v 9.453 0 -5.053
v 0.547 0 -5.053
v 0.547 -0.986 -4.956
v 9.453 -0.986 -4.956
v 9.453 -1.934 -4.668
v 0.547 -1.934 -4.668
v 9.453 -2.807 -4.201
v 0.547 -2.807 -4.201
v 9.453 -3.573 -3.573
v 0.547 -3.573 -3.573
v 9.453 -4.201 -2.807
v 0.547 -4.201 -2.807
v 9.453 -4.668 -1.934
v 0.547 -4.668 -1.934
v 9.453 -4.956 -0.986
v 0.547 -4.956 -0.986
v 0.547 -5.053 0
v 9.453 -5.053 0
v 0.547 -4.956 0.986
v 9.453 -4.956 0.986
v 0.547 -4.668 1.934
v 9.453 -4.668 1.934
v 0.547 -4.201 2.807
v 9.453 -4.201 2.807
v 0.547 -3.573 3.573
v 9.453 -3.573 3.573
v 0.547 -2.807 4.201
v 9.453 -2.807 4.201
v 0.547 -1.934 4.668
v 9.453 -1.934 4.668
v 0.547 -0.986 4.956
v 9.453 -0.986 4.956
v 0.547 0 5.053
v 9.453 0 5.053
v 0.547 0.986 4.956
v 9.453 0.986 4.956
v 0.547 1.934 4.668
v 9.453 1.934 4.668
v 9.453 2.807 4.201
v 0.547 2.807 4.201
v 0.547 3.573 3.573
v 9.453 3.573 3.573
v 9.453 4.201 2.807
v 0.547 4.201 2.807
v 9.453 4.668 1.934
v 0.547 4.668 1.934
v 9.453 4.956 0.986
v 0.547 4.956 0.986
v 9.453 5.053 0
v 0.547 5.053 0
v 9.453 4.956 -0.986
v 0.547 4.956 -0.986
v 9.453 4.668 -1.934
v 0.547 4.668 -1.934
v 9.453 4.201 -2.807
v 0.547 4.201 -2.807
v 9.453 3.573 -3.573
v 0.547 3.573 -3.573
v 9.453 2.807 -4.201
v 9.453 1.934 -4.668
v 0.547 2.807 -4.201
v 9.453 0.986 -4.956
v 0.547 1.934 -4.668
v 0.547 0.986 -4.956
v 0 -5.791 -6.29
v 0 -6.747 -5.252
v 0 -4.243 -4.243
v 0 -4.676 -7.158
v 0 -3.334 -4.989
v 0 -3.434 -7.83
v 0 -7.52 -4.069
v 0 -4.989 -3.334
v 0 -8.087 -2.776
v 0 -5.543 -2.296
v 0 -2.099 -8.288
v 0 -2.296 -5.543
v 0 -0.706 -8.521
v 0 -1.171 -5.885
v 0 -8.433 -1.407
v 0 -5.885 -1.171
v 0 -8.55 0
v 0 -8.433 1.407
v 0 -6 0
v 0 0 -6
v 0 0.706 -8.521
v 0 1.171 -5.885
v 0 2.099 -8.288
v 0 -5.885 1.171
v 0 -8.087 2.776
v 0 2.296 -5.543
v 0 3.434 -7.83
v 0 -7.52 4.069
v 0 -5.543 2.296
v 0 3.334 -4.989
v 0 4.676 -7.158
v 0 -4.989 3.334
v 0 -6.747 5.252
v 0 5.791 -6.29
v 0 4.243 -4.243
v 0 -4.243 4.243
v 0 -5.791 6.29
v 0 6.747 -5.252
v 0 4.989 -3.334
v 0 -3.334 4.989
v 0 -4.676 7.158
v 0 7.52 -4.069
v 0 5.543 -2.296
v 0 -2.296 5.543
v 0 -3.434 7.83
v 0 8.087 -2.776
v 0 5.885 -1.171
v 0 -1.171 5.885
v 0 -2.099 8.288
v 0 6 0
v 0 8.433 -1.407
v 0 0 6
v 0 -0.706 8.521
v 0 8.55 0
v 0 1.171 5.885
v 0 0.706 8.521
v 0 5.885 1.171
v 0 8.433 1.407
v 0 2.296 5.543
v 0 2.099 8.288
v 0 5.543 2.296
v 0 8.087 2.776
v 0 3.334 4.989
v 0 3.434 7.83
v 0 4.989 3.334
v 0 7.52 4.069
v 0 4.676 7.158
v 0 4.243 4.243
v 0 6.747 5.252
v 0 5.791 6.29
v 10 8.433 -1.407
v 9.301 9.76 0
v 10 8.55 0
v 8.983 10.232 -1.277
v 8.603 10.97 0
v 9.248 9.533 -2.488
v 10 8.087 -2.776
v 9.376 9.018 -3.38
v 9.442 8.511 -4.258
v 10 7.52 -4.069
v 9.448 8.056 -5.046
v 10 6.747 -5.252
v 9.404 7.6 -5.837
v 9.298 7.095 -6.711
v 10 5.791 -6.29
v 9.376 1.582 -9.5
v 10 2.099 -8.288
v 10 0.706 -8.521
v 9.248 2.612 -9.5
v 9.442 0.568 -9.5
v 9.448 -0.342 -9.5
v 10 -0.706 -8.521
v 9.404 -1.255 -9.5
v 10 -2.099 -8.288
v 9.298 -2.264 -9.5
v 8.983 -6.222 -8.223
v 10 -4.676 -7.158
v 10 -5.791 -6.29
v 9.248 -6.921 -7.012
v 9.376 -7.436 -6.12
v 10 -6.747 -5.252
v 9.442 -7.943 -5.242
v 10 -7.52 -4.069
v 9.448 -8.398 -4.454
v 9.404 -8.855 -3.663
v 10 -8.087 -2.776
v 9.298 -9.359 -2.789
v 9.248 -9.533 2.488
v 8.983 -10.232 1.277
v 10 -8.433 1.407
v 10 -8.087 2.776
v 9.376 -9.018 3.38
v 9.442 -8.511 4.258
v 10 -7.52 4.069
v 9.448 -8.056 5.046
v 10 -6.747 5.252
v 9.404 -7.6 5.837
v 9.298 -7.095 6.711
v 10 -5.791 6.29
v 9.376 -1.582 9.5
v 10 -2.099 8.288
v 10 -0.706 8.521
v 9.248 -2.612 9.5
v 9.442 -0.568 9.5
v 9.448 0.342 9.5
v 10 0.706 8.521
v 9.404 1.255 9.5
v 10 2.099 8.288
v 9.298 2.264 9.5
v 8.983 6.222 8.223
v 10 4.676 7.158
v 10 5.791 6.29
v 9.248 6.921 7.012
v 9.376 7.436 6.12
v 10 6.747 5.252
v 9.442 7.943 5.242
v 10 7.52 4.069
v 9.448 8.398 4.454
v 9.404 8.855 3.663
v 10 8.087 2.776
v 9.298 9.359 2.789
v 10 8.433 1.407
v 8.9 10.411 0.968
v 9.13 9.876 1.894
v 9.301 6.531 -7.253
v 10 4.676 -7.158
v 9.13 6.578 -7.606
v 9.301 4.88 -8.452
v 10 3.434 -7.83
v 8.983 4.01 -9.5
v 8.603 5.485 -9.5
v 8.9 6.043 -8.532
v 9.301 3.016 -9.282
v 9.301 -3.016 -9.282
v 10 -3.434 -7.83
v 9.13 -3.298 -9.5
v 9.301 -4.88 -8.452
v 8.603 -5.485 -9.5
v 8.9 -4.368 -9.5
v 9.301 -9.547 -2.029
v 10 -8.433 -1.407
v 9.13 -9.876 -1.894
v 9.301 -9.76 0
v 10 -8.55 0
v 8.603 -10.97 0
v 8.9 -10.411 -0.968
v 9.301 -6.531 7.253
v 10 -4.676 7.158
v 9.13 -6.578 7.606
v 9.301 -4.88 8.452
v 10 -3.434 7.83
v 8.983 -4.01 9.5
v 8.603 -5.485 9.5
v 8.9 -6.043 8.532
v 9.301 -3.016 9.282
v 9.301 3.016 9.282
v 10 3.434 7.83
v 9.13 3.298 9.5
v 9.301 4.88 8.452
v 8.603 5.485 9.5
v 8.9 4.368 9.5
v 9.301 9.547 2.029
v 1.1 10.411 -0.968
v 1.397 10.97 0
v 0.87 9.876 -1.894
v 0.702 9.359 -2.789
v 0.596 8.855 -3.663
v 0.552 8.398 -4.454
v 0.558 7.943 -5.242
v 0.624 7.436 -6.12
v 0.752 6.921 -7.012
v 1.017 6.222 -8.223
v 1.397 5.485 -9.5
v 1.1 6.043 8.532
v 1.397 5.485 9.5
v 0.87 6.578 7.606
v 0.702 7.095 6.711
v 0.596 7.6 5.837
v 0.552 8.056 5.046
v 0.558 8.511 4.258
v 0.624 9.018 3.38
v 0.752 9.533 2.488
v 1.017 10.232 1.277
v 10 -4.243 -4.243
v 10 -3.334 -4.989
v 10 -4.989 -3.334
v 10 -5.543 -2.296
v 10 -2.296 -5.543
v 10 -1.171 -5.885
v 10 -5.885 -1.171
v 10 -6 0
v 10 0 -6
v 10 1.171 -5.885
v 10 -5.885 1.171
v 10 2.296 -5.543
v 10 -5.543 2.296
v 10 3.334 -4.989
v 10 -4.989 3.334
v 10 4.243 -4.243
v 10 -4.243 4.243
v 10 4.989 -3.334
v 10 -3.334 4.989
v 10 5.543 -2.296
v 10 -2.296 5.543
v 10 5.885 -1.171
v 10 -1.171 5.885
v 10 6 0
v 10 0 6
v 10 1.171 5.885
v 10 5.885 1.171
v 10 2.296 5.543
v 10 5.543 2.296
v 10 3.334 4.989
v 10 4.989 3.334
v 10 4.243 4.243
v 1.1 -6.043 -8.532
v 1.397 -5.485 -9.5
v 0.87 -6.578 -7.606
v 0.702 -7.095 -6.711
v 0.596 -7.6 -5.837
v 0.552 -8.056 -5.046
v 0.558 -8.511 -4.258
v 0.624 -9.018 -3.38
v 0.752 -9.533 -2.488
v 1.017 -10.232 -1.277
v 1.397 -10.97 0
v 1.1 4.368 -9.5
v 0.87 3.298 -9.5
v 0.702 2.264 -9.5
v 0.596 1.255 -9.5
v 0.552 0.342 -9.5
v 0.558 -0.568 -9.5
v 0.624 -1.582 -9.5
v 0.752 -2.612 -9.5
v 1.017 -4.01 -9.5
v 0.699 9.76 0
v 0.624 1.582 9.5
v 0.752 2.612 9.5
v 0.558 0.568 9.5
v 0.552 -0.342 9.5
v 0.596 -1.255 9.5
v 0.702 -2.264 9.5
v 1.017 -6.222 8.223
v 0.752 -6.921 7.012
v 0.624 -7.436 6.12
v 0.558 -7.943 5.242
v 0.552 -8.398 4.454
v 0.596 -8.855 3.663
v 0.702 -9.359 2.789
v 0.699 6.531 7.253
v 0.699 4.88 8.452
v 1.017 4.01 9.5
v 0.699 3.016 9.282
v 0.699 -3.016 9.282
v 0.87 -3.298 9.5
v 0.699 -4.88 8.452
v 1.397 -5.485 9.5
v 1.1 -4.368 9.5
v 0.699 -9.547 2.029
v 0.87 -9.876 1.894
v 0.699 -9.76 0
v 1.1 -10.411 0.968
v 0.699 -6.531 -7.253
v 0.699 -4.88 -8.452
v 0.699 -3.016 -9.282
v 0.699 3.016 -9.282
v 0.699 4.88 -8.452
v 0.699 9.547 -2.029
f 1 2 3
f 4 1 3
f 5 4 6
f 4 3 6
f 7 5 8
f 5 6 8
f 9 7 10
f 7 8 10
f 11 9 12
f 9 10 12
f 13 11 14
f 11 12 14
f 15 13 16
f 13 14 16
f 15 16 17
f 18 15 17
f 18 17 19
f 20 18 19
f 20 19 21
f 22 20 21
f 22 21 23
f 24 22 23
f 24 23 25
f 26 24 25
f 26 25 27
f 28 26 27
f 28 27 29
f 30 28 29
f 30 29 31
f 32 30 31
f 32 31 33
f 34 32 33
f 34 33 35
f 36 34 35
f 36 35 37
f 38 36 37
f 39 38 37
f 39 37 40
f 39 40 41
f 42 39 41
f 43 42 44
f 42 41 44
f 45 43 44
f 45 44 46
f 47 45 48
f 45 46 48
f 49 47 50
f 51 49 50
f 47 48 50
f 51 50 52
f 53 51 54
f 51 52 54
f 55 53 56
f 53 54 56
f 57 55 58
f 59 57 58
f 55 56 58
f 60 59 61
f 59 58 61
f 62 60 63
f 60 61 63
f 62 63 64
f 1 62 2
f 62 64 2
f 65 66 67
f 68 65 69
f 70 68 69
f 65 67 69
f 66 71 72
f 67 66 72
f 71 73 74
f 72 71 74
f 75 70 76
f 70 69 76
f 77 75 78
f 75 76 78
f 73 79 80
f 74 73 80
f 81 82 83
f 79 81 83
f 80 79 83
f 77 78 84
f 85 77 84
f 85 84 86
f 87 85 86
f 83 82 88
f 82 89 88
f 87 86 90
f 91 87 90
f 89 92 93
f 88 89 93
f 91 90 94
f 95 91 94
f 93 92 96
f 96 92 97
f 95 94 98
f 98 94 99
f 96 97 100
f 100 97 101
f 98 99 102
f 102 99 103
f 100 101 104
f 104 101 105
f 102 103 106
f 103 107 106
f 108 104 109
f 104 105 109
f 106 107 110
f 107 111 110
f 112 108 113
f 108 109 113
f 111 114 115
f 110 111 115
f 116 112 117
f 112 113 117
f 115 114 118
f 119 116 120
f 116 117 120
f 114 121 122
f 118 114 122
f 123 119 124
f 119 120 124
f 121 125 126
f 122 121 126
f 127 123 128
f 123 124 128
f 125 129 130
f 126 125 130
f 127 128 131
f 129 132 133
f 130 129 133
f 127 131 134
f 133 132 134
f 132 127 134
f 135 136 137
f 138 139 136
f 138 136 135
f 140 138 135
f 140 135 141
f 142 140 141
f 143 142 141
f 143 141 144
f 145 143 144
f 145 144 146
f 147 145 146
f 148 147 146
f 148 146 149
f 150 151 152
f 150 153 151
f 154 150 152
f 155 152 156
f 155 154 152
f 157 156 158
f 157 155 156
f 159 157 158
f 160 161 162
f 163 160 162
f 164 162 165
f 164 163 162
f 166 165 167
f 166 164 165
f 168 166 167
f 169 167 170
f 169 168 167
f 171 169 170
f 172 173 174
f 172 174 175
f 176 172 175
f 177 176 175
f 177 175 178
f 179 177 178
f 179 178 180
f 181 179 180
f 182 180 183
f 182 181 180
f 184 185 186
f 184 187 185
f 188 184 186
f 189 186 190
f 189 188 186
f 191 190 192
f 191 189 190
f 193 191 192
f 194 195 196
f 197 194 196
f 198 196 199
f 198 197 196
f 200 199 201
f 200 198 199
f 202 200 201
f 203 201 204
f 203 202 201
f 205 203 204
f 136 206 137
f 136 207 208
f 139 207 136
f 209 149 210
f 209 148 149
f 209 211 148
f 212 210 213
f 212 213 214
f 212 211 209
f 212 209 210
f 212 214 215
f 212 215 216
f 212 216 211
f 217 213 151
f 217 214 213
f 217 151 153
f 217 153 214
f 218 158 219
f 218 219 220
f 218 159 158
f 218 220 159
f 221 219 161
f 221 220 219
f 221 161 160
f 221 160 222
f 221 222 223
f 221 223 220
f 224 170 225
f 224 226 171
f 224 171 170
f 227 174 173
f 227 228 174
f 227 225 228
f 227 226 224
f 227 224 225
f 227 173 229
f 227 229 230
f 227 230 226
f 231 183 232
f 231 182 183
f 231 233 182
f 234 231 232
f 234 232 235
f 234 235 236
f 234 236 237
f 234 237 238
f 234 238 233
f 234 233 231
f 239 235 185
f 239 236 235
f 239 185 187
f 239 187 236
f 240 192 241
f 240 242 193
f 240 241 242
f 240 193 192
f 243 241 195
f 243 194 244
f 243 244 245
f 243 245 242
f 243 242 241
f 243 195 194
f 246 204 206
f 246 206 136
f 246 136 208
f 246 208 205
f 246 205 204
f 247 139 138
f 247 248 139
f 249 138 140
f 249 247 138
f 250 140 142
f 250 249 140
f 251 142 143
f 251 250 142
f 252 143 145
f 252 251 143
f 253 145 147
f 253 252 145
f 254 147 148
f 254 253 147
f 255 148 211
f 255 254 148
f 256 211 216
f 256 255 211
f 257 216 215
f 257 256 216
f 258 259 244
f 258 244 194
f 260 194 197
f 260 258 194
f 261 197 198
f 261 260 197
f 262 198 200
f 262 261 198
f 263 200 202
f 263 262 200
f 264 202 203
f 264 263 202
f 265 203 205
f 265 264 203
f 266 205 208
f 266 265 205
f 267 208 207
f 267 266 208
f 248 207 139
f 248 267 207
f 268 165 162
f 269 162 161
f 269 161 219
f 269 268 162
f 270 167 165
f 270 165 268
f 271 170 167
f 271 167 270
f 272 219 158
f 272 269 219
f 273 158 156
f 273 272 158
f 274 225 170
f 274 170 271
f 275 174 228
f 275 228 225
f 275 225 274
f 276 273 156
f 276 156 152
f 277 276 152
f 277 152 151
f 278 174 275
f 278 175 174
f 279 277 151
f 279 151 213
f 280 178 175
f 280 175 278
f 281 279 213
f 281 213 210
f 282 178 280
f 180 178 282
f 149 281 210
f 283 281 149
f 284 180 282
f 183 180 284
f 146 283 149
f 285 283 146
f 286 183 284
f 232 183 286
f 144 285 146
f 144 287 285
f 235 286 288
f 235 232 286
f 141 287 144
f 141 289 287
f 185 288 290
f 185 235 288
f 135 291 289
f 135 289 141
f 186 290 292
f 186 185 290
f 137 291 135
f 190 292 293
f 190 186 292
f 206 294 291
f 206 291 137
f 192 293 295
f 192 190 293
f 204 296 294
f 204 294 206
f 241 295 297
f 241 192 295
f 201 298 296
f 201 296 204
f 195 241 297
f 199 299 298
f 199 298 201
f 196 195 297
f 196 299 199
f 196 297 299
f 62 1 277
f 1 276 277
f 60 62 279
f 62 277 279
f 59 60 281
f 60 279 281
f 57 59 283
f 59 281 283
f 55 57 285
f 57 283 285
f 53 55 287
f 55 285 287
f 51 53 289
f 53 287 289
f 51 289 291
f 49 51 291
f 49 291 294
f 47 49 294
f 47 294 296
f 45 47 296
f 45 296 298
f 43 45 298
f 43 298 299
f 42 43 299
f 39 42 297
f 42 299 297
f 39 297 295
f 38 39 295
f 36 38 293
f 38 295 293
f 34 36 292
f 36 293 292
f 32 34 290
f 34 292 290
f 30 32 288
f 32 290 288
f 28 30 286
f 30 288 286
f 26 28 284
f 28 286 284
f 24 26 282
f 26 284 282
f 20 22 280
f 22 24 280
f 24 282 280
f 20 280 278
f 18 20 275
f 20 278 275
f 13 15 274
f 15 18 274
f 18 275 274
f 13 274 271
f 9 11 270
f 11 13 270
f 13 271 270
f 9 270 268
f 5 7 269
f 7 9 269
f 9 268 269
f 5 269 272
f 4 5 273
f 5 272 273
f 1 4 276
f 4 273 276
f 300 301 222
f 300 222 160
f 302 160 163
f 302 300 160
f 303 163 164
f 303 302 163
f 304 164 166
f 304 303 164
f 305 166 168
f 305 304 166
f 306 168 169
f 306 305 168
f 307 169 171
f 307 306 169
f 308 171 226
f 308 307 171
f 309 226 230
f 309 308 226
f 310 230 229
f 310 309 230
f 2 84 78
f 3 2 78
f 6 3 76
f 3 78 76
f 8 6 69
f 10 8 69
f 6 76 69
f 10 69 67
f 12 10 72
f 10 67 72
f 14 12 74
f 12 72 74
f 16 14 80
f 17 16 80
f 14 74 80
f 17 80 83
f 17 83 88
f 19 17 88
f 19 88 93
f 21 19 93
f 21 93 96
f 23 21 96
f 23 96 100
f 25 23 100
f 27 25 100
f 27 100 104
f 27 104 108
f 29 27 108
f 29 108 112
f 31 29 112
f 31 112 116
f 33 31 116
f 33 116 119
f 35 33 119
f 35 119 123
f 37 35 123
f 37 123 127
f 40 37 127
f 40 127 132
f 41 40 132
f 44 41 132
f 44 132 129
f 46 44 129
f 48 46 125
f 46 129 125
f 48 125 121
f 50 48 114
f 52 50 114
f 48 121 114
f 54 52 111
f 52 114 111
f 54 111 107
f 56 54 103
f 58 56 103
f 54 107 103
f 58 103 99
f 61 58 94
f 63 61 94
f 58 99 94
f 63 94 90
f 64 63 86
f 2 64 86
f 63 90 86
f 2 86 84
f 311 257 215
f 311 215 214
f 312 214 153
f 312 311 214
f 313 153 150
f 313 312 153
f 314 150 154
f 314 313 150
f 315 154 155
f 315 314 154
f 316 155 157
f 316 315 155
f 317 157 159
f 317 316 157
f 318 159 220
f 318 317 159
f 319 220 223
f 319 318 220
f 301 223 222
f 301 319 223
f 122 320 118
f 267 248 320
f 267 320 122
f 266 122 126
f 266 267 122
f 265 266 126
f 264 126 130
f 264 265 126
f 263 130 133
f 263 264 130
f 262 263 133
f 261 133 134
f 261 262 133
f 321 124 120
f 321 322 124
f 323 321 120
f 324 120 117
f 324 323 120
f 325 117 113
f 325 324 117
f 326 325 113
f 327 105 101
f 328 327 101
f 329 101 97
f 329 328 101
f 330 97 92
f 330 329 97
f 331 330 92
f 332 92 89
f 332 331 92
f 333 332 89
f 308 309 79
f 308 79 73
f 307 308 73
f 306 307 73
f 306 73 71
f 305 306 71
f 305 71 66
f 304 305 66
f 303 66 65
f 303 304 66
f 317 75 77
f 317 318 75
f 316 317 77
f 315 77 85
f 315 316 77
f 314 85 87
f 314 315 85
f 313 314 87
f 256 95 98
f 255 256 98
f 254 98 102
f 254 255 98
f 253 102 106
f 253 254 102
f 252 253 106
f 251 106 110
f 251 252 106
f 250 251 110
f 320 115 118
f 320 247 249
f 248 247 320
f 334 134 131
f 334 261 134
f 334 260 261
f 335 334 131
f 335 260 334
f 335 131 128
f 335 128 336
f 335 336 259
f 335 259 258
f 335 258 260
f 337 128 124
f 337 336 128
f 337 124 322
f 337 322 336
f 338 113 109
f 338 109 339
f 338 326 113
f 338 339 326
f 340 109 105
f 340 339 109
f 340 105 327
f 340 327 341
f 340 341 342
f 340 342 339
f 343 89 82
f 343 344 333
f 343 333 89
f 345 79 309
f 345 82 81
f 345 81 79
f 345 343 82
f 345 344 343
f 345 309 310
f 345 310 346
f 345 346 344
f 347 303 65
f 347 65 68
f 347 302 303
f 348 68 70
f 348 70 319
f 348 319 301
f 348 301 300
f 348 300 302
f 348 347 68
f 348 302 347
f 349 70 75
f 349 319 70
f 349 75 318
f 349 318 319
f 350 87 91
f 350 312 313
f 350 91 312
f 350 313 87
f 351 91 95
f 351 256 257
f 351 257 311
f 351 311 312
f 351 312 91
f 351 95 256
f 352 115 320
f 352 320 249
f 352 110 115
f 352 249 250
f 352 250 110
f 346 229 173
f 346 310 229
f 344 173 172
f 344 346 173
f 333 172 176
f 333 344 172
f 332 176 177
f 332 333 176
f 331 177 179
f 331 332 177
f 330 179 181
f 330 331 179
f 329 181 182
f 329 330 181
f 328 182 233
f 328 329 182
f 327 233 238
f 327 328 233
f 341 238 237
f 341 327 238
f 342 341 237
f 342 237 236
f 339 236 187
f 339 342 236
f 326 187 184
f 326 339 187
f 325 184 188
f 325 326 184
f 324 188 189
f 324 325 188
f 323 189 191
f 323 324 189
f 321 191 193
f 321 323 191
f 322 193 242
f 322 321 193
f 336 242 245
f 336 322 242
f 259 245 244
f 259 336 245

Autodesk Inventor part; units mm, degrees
ref_plane "YZ Plane" through (0, 0, 0) normal (1, 0, 0) x (0, 1, 0)
ref_plane "XZ Plane" through (0, 0, 0) normal (0, 1, 0) x (-1, 0, 0)
sketch "Sketch1" plane through (0, 0, 0) normal (1, 0, 0) x (0, 1, 0)
  line L0 (-10.9697, 0) -> (-5.4848, 9.5)
  line L1 (-5.4848, 9.5) -> (5.4848, 9.5)
  line L2 (5.4848, 9.5) -> (10.9697, 0)
  line L3 (10.9697, 0) -> (5.4848, -9.5)
  line L4 (5.4848, -9.5) -> (-5.4848, -9.5)
  line L5 (-5.4848, -9.5) -> (-10.9697, 0)
  point P0 (0, 0)
  point P1 (0, 0)
  dimension "d0" = 21.9393
extrude "Body" add sketch "Sketch1" along normal blind 10
sketch "Sketch2" plane through (0, 0, 0) normal (0, 0, 1) x (1, 0, 0)
  line L0 (0, 5.4848) -> (0, 10.9697) projected
  line L1 (0, 10.9697) -> (10, 10.9697) projected
  line L2 (10, 5.4848) -> (10, 10.9697) projected
  line L3 (-2, 0) -> (12, 0) projected
  line L4 (1.397, 10.9697) -> (0, 8.55)
  line L5 (8.603, 10.9697) -> (10, 8.55)
  dimension "d3" = 30
  dimension "d4" = 30
  dimension "d5" = 17.1
  dimension "d6" = 17.1
revolve "Chamfer1" cut sketch "Sketch2" angle 360 about axis through (-10, 0, 0) along (1, 0, 0)
sketch "Sketch3" plane through (10, 0, 0) normal (1, 0, 0) x (0, 0, -1)
  arc A0 (-0.625, -1.0825) -> (0.625, -1.0825) centre (0, 0) ccw projected
hole "Thread" at (10, 0, 0) direction (-1, 0, 0) diameter 10.106 end through all thread size "M12x1.75" class "6H" standard "ISO Metric profile"
chamfer "Chamfer2" distance 0.9472 angle 30 1 edges at (10, 0, 5.053) measured on face at (10, 7.2892, -0.8851)
chamfer "Chamfer3" distance 0.9472 angle 30 1 edges at (0, 0, 5.053) measured on face at (0, 7.2892, -0.8851)
ref_plane "Work Plane1" through (-20.8209, 0, 0) normal (0, -0.866, -0.5) x (1, 0, 0)
equation "\"d0\" = 1.1547 * SW"
equation "\"d1\" = KOH"
equation "\"d8\" = -0.5 * GD1 + 0.5 * NND"
equation "\"d40\" = -0.5 * GD1 + 0.5 * NND"
equation "\"d10\" = -0.5 * GD1 + 0.5 * NND"
equation "\"d41\" = -0.5 * GD1 + 0.5 * NND"
equation "\"d3\" = ANG1"
equation "\"d4\" = ANG2"
equation "\"d5\" = SW0"
equation "\"d6\" = SW01"
equation "\"ANG1\" = 30deg"
equation "\"ANG2\" = 30deg"
equation "\"NND\" = 12"
equation "\"KOH\" = 10"
equation "\"SW\" = 19"
equation "\"SW0\" = 17.1"
equation "\"SW01\" = SW0"
equation "\"GUL\" = 0.541266 * PTC"
equation "\"LADI\" = 18.05"
equation "\"TOA\" = 30deg"
equation "\"FAWI\" = 30deg"
equation "\"PTC\" = 1.75"
equation "\"THREADDIA\" = 12"
equation "\"E0\" = 1.155 * SW"
equation "\"GAL\" = 0.541266 * PTC"
equation "\"GD1\" = 10.105569"
properties part number "Nut M12-6H GOST 5915-70" material "Steel"
